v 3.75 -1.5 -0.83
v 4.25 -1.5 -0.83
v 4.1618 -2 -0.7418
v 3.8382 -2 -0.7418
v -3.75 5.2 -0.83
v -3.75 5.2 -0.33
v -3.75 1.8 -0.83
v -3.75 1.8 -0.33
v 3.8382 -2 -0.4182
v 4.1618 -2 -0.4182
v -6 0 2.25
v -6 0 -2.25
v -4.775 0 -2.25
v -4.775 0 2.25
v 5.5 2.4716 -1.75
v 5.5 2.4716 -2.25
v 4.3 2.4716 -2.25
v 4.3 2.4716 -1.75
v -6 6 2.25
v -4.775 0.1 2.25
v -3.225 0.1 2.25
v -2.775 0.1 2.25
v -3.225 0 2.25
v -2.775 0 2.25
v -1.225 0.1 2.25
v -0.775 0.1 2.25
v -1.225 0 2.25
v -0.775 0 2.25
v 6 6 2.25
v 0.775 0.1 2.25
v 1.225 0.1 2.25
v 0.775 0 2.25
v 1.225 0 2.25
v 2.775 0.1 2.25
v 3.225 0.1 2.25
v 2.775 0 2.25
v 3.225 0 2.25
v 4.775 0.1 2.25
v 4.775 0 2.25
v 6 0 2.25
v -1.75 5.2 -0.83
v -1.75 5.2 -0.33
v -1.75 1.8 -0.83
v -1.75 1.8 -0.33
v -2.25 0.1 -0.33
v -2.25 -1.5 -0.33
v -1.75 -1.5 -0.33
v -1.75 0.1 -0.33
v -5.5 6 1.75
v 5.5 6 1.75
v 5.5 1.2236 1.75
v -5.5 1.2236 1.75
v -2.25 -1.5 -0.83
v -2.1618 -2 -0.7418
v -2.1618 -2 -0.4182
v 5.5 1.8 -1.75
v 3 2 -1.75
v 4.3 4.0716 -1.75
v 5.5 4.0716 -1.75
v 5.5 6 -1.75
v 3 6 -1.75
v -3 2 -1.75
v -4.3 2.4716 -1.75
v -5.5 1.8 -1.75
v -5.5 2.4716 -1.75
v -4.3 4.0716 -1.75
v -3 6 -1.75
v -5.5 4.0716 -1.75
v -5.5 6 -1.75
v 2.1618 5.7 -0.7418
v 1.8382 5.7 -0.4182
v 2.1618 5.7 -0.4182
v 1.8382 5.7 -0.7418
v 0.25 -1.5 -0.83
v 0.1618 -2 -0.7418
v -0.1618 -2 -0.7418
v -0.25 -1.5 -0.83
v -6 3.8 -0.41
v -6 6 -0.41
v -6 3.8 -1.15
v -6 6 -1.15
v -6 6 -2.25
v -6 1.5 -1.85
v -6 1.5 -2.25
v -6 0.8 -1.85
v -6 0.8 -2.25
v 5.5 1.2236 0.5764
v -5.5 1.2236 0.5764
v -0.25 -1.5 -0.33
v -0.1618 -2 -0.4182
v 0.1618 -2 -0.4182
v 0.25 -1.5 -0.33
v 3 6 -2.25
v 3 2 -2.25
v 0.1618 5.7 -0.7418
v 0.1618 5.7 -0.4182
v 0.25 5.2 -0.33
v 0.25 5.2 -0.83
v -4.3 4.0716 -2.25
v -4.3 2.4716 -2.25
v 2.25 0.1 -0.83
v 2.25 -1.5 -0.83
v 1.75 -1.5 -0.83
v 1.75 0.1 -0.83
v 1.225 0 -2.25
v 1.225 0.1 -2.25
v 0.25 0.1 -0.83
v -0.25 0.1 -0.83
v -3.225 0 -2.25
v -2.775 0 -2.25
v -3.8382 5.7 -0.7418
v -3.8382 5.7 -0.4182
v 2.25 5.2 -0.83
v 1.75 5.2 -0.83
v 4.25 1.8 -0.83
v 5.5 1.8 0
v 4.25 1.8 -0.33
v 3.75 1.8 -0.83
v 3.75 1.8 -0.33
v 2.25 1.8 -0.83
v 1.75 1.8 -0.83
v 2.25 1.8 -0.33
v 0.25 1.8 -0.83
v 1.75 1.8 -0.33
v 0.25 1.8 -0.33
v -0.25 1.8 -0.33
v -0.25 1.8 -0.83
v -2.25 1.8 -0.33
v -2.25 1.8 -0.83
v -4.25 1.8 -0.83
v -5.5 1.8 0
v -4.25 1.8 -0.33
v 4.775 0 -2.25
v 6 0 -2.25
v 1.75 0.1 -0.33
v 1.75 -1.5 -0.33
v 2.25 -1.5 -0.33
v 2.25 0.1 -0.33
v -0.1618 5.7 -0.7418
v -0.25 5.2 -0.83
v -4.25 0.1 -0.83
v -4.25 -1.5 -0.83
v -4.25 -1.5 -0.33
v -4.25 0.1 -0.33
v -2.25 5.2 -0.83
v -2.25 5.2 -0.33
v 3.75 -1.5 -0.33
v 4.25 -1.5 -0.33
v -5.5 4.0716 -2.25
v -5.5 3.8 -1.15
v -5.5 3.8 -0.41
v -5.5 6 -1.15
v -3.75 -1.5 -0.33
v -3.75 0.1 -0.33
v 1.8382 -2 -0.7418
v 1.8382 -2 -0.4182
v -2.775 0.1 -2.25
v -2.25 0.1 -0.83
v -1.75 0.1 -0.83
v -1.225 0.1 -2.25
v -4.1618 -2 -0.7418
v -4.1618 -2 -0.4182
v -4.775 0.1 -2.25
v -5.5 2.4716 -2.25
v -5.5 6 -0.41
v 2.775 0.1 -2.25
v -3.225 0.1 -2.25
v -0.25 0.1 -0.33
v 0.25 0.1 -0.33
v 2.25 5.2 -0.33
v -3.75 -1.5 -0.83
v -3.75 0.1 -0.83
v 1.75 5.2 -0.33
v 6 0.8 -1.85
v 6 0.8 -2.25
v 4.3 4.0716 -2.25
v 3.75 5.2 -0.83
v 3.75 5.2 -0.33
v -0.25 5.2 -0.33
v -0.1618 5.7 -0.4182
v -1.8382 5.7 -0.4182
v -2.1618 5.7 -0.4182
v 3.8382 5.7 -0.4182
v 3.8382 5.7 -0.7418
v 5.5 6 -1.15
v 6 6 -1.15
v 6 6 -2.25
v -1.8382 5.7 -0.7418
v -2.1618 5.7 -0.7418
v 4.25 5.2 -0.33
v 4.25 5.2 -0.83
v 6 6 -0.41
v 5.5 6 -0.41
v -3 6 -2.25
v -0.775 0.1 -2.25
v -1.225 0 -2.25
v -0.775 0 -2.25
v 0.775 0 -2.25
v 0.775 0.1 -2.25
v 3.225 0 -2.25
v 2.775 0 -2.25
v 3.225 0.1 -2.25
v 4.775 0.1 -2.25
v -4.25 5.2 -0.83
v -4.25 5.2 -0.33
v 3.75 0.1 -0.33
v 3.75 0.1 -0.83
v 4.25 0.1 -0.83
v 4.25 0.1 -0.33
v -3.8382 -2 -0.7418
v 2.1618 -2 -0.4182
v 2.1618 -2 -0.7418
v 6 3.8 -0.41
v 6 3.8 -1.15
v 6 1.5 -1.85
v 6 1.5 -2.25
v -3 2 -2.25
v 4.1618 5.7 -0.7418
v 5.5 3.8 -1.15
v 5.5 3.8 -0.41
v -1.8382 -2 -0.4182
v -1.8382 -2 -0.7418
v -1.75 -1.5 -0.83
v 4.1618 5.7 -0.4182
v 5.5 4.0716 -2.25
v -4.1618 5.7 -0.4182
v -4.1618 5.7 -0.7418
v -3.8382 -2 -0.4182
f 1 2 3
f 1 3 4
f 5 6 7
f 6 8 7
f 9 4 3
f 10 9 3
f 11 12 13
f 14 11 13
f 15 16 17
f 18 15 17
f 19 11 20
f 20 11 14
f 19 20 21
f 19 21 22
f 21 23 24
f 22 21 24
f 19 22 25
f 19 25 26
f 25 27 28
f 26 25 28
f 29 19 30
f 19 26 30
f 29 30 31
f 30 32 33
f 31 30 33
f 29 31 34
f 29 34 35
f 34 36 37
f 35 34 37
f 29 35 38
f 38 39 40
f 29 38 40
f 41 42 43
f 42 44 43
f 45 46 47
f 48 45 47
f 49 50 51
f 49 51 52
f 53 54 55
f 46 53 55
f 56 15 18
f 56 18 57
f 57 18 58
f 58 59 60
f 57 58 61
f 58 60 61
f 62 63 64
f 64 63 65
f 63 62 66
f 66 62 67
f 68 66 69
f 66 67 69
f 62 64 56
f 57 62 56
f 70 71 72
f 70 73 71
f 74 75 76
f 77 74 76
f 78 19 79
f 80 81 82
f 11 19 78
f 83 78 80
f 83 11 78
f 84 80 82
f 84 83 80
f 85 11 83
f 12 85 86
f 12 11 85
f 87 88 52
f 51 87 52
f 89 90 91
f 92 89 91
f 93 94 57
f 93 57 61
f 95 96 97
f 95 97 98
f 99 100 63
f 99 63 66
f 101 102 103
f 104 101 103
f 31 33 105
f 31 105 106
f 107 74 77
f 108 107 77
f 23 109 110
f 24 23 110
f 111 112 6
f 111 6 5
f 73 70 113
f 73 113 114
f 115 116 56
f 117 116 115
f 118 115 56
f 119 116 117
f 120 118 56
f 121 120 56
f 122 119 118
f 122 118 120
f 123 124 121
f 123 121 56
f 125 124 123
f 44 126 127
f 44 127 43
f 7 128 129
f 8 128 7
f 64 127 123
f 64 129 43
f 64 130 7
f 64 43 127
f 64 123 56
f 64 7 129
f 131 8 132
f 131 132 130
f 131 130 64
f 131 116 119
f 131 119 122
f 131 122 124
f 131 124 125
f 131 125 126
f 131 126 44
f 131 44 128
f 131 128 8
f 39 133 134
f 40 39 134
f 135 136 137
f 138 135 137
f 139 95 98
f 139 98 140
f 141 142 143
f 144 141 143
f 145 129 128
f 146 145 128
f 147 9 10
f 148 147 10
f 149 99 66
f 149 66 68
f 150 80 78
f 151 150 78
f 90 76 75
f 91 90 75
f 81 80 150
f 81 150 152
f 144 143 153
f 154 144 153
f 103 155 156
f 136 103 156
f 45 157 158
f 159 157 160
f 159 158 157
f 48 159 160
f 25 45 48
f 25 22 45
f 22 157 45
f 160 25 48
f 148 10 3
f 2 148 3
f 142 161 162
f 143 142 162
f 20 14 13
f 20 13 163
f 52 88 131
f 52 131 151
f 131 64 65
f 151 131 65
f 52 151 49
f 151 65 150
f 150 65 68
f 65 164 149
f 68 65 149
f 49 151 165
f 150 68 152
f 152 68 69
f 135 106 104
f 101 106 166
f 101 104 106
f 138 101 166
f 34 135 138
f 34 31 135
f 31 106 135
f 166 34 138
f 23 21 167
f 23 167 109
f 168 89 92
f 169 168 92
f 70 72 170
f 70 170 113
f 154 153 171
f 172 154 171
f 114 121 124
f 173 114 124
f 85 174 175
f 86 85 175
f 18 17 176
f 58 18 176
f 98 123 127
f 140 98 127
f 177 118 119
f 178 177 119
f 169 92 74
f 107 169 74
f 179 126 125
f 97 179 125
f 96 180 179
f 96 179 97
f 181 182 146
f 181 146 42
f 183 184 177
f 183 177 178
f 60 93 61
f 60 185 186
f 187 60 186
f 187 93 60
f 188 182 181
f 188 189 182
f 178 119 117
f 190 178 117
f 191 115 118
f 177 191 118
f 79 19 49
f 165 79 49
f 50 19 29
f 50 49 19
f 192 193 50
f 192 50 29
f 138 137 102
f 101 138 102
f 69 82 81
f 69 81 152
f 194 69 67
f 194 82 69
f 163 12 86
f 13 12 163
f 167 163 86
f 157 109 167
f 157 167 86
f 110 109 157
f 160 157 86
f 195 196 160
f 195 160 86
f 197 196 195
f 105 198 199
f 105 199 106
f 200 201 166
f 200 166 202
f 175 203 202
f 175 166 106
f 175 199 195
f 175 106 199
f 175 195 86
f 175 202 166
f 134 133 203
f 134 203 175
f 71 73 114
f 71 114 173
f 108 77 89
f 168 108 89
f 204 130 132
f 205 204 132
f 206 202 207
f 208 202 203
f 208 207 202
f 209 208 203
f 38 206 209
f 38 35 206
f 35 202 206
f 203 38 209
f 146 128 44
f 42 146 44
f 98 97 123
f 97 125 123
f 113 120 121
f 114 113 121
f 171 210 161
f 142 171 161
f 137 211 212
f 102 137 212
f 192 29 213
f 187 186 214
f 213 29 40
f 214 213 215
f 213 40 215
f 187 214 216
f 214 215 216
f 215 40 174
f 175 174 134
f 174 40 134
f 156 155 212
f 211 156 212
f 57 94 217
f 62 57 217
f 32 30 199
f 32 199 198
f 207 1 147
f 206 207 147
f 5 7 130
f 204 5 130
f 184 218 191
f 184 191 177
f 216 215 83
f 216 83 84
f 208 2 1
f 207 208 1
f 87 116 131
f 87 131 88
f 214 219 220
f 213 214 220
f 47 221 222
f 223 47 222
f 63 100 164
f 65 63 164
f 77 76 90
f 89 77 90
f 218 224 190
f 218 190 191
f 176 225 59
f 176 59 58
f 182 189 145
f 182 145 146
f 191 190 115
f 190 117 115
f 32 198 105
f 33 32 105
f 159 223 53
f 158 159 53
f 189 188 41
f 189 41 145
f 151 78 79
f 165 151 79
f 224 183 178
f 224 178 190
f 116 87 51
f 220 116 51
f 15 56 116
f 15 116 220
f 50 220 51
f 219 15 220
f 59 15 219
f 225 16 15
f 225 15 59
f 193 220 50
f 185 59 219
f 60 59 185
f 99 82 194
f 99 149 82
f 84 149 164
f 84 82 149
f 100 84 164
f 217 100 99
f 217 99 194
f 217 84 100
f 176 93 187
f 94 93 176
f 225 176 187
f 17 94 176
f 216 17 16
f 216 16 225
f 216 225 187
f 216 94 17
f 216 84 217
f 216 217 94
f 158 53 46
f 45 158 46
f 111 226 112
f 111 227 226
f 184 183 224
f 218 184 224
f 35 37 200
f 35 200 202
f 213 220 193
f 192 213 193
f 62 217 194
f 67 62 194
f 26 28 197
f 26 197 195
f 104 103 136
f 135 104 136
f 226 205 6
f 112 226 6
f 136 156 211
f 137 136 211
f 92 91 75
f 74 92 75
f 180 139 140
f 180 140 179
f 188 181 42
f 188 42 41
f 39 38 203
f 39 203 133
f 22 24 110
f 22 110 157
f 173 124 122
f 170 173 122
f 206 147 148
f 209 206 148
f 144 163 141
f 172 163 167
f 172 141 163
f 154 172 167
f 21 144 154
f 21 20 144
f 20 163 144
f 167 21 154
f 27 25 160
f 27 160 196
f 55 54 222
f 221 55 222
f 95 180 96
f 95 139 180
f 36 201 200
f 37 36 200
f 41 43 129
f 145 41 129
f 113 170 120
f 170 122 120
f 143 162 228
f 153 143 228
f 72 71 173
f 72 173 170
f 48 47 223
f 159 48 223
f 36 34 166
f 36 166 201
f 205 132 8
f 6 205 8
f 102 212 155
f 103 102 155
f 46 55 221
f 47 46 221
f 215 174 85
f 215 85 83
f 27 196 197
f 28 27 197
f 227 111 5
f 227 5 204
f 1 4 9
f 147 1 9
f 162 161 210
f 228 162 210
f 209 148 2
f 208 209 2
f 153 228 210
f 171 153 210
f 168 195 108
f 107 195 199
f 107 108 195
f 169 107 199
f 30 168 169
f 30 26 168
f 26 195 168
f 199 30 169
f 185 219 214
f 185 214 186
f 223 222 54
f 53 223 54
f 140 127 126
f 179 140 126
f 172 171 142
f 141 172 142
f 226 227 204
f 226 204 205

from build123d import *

# Parameters (mm, degrees)
SKETCH1_W               = 12
SKETCH1_H               = 4.5
EXTRUDE1_DEPTH          = 6
CUT_EXTRUDE1_DEPTH      = 5.5
SKETCH3_W               = 11
SKETCH3_H               = 3.5
CUT_EXTRUDE2_DEPTH      = 4.2
SKETCH5_W               = 0.74
SKETCH5_H               = 2.2
CUT_EXTRUDE3_DEPTH      = 13
SKETCH6_W               = 6
SKETCH6_H               = 4
CUT_EXTRUDE4_DEPTH      = 1.2
SKETCH9_W               = 0.4
SKETCH9_H               = 0.7
CUT_EXTRUDE5_DEPTH      = 7
CUT_EXTRUDE5_DEPTH_BACK = 7
SKETCH10_W              = 1.2
SKETCH10_H              = 1.6
CUT_EXTRUDE6_DEPTH      = 0.5
CUT_EXTRUDE7_START      = -5.5
CUT_EXTRUDE7_DEPTH      = 11
LPATTERN4_COUNT         = 3
LPATTERN4_PITCH         = 2
LPATTERN4_COL_COUNT     = 3
LPATTERN4_COL_PITCH     = 2
EXTRUDE2_START          = -2
EXTRUDE2_DEPTH          = 7.7
LPATTERN2_COUNT         = 3
LPATTERN2_PITCH         = 2
LPATTERN2_COL_COUNT     = 3
LPATTERN2_COL_PITCH     = 2
CHAMFER1_SIZE           = 0.5
CHAMFER1_SIZE2          = 0.08816349
CHAMFER1_PART_2_SIZE    = 0.5
CHAMFER1_PART_2_SIZE2   = 0.08816349
CHAMFER1_PART_3_SIZE    = 0.5
CHAMFER1_PART_3_SIZE2   = 0.08816349
CHAMFER1_PART_4_SIZE    = 0.5
CHAMFER1_PART_4_SIZE2   = 0.08816349
CHAMFER1_PART_5_SIZE    = 0.5
CHAMFER1_PART_5_SIZE2   = 0.08816349
CHAMFER1_PART_6_SIZE    = 0.5
CHAMFER1_PART_6_SIZE2   = 0.08816349
CHAMFER1_PART_7_SIZE    = 0.5
CHAMFER1_PART_7_SIZE2   = 0.08816349
CHAMFER1_PART_8_SIZE    = 0.5
CHAMFER1_PART_8_SIZE2   = 0.08816349
CHAMFER1_PART_9_SIZE    = 0.5
CHAMFER1_PART_9_SIZE2   = 0.08816349
CHAMFER1_PART_10_SIZE   = 0.5
CHAMFER1_PART_10_SIZE2  = 0.08816349
CHAMFER1_PART_11_SIZE   = 0.5
CHAMFER1_PART_11_SIZE2  = 0.08816349
CHAMFER1_PART_12_SIZE   = 0.5
CHAMFER1_PART_12_SIZE2  = 0.08816349
CHAMFER1_PART_13_SIZE   = 0.5
CHAMFER1_PART_13_SIZE2  = 0.08816349
CHAMFER1_PART_14_SIZE   = 0.5
CHAMFER1_PART_14_SIZE2  = 0.08816349
CHAMFER1_PART_15_SIZE   = 0.5
CHAMFER1_PART_15_SIZE2  = 0.08816349
CHAMFER1_PART_16_SIZE   = 0.5
CHAMFER1_PART_16_SIZE2  = 0.08816349
CHAMFER1_PART_17_SIZE   = 0.5
CHAMFER1_PART_17_SIZE2  = 0.08816349
CHAMFER1_PART_18_SIZE   = 0.5
CHAMFER1_PART_18_SIZE2  = 0.08816349
CHAMFER1_PART_19_SIZE   = 0.5
CHAMFER1_PART_19_SIZE2  = 0.08816349
CHAMFER1_PART_20_SIZE   = 0.5
CHAMFER1_PART_20_SIZE2  = 0.08816349
CHAMFER1_PART_21_SIZE   = 0.5
CHAMFER1_PART_21_SIZE2  = 0.08816349
CHAMFER1_PART_22_SIZE   = 0.5
CHAMFER1_PART_22_SIZE2  = 0.08816349
CHAMFER1_PART_23_SIZE   = 0.5
CHAMFER1_PART_23_SIZE2  = 0.08816349
CHAMFER1_PART_24_SIZE   = 0.5
CHAMFER1_PART_24_SIZE2  = 0.08816349
CHAMFER1_PART_25_SIZE   = 0.5
CHAMFER1_PART_25_SIZE2  = 0.08816349
CHAMFER1_PART_26_SIZE   = 0.5
CHAMFER1_PART_26_SIZE2  = 0.08816349
CHAMFER1_PART_27_SIZE   = 0.5
CHAMFER1_PART_27_SIZE2  = 0.08816349
CHAMFER1_PART_28_SIZE   = 0.5
CHAMFER1_PART_28_SIZE2  = 0.08816349
CHAMFER1_PART_29_SIZE   = 0.5
CHAMFER1_PART_29_SIZE2  = 0.08816349
CHAMFER1_PART_30_SIZE   = 0.5
CHAMFER1_PART_30_SIZE2  = 0.08816349
CHAMFER1_PART_31_SIZE   = 0.5
CHAMFER1_PART_31_SIZE2  = 0.08816349
CHAMFER1_PART_32_SIZE   = 0.5
CHAMFER1_PART_32_SIZE2  = 0.08816349
CHAMFER1_PART_33_SIZE   = 0.5
CHAMFER1_PART_33_SIZE2  = 0.08816349
CHAMFER1_PART_34_SIZE   = 0.5
CHAMFER1_PART_34_SIZE2  = 0.08816349
CHAMFER1_PART_35_SIZE   = 0.5
CHAMFER1_PART_35_SIZE2  = 0.08816349
CHAMFER1_PART_36_SIZE   = 0.5
CHAMFER1_PART_36_SIZE2  = 0.08816349
CHAMFER1_PART_37_SIZE   = 0.5
CHAMFER1_PART_37_SIZE2  = 0.08816349
CHAMFER1_PART_38_SIZE   = 0.5
CHAMFER1_PART_38_SIZE2  = 0.08816349
CHAMFER1_PART_39_SIZE   = 0.5
CHAMFER1_PART_39_SIZE2  = 0.08816349
CHAMFER1_PART_40_SIZE   = 0.5
CHAMFER1_PART_40_SIZE2  = 0.08816349


with BuildPart() as part:
    # Sketch1 → Extrude1 (new body)
    with BuildSketch(Plane(origin=(0, 0, 0), x_dir=(1, 0, 0), z_dir=(0, 1, 0))):
        Rectangle(SKETCH1_W, SKETCH1_H)
    extrude(amount=EXTRUDE1_DEPTH)

    # Sketch2 → Cut-Extrude1 (cut, through all)
    with BuildSketch(Plane.XY.offset(2.25)):
        Polygon((-0.775, 0.1), (0.775, 0.1), (0.775, 0), (0, 0), (-0.775, 0), align=None)
    cut_extrude1 = extrude(amount=-CUT_EXTRUDE1_DEPTH, mode=Mode.SUBTRACT)

    # Sketch3 → Cut-Extrude2 (cut)
    with BuildSketch(Plane(origin=(0, 6, 0), x_dir=(-1, 0, 0), z_dir=(0, 1, 0))):
        Rectangle(SKETCH3_W, SKETCH3_H)
    extrude(amount=-CUT_EXTRUDE2_DEPTH, mode=Mode.SUBTRACT)

    # Sketch5 → Cut-Extrude3 (cut, through all)
    with BuildSketch(Plane.ZY.offset(6)):
        with Locations((-0.78, 4.9)):
            Rectangle(SKETCH5_W, SKETCH5_H)
    extrude(amount=-CUT_EXTRUDE3_DEPTH, mode=Mode.SUBTRACT)

    # Sketch6 → Cut-Extrude4 (cut)
    with BuildSketch(Plane(origin=(0, 0, -2.25), x_dir=(-1, 0, 0), z_dir=(0, 0, -1))):
        with Locations((0, 4)):
            Rectangle(SKETCH6_W, SKETCH6_H)
    extrude(amount=-CUT_EXTRUDE4_DEPTH, mode=Mode.SUBTRACT)

    # Sketch9 → Cut-Extrude5 (cut, two sides)
    with BuildSketch(Plane(origin=(0, 0, 0), x_dir=(0, 0, -1), z_dir=(1, 0, 0))) as cut_extrude5_sk:
        with Locations((2.05, 1.15)):
            Rectangle(SKETCH9_W, SKETCH9_H)
    extrude(amount=CUT_EXTRUDE5_DEPTH, mode=Mode.SUBTRACT)
    extrude(cut_extrude5_sk.sketch, amount=-CUT_EXTRUDE5_DEPTH_BACK, mode=Mode.SUBTRACT)

    # Sketch10 → Cut-Extrude6 (cut)
    with BuildSketch(Plane(origin=(0, 0, -2.25), x_dir=(-1, 0, 0), z_dir=(0, 0, -1))):
        with Locations((-4.9, 3.271645398)):
            Rectangle(SKETCH10_W, SKETCH10_H)
        with Locations((4.9, 3.271645398)):
            Rectangle(SKETCH10_W, SKETCH10_H)
    extrude(amount=-CUT_EXTRUDE6_DEPTH, mode=Mode.SUBTRACT)

    # Sketch11 → Cut-Extrude7 (cut)
    with BuildSketch(Plane(origin=(0, 0, 0), x_dir=(0, 0, -1), z_dir=(1, 0, 0)).offset(CUT_EXTRUDE7_START)):
        Polygon((0, 1.8), (-0.576387184, 1.223612816), (-1.75, 1.223612816), (-1.75, 1.8), align=None)
    extrude(amount=CUT_EXTRUDE7_DEPTH, mode=Mode.SUBTRACT)

    # LPattern4: Cut-Extrude1 ×3
    with Locations(*[(i * LPATTERN4_PITCH, 0, 0) for i in range(1, LPATTERN4_COUNT)]):
        add(cut_extrude1, mode=Mode.SUBTRACT)

    # LPattern4 col: Cut-Extrude1 ×3
    with Locations(*[(-i * LPATTERN4_COL_PITCH, 0, 0) for i in range(1, LPATTERN4_COL_COUNT)]):
        add(cut_extrude1, mode=Mode.SUBTRACT)

    # Sketch7 → Extrude2 (add)
    with BuildSketch(Plane(origin=(0, 0, 0), x_dir=(1, 0, 0), z_dir=(0, 1, 0)).offset(EXTRUDE2_START)):
        Polygon((0, 0.33), (0.25, 0.33), (0.25, 0.83), (-0.25, 0.83), (-0.25, 0.33), align=None)
    extrude2 = extrude(amount=EXTRUDE2_DEPTH)

    # LPattern2: Extrude2 ×3
    with Locations(*[(i * LPATTERN2_PITCH, 0, 0) for i in range(1, LPATTERN2_COUNT)]):
        add(extrude2)

    # LPattern2 col: Extrude2 ×3
    with Locations(*[(-i * LPATTERN2_COL_PITCH, 0, 0) for i in range(1, LPATTERN2_COL_COUNT)]):
        add(extrude2)

    # Chamfer1
    chamfer1_edges = [part.edges().sort_by_distance(p)[0] for p in [
        (-0.25, -2, -0.58),
    ]]
    chamfer1_side = [part.faces().sort_by_distance(p)[0] for p in [
        (-0.25, -0.95, -0.58),
    ]]
    chamfer(chamfer1_edges, length=CHAMFER1_SIZE, length2=CHAMFER1_SIZE2, reference=chamfer1_side[0])

    # Chamfer1 part 2
    chamfer1_part_2_edges = [part.edges().sort_by_distance(p)[0] for p in [
        (0, -2, -0.33),
    ]]
    chamfer1_part_2_side = [part.faces().sort_by_distance(p)[0] for p in [
        (0, -0.95, -0.33),
    ]]
    chamfer(chamfer1_part_2_edges, length=CHAMFER1_PART_2_SIZE, length2=CHAMFER1_PART_2_SIZE2, reference=chamfer1_part_2_side[0])

    # Chamfer1 part 3
    chamfer1_part_3_edges = [part.edges().sort_by_distance(p)[0] for p in [
        (0.25, -2, -0.58),
    ]]
    chamfer1_part_3_side = [part.faces().sort_by_distance(p)[0] for p in [
        (0.25, -0.95, -0.58),
    ]]
    chamfer(chamfer1_part_3_edges, length=CHAMFER1_PART_3_SIZE, length2=CHAMFER1_PART_3_SIZE2, reference=chamfer1_part_3_side[0])

    # Chamfer1 part 4
    chamfer1_part_4_edges = [part.edges().sort_by_distance(p)[0] for p in [
        (0, -2, -0.83),
    ]]
    chamfer1_part_4_side = [part.faces().sort_by_distance(p)[0] for p in [
        (0, -0.95, -0.83),
    ]]
    chamfer(chamfer1_part_4_edges, length=CHAMFER1_PART_4_SIZE, length2=CHAMFER1_PART_4_SIZE2, reference=chamfer1_part_4_side[0])

    # Chamfer1 part 5
    chamfer1_part_5_edges = [part.edges().sort_by_distance(p)[0] for p in [
        (0, 5.7, -0.83),
    ]]
    chamfer1_part_5_side = [part.faces().sort_by_distance(p)[0] for p in [
        (0, 3.75, -0.83),
    ]]
    chamfer(chamfer1_part_5_edges, length=CHAMFER1_PART_5_SIZE, length2=CHAMFER1_PART_5_SIZE2, reference=chamfer1_part_5_side[0])

    # Chamfer1 part 6
    chamfer1_part_6_edges = [part.edges().sort_by_distance(p)[0] for p in [
        (-0.25, 5.7, -0.58),
    ]]
    chamfer1_part_6_side = [part.faces().sort_by_distance(p)[0] for p in [
        (-0.25, 3.75, -0.58),
    ]]
    chamfer(chamfer1_part_6_edges, length=CHAMFER1_PART_6_SIZE, length2=CHAMFER1_PART_6_SIZE2, reference=chamfer1_part_6_side[0])

    # Chamfer1 part 7
    chamfer1_part_7_edges = [part.edges().sort_by_distance(p)[0] for p in [
        (0, 5.7, -0.33),
    ]]
    chamfer1_part_7_side = [part.faces().sort_by_distance(p)[0] for p in [
        (0, 3.75, -0.33),
    ]]
    chamfer(chamfer1_part_7_edges, length=CHAMFER1_PART_7_SIZE, length2=CHAMFER1_PART_7_SIZE2, reference=chamfer1_part_7_side[0])

    # Chamfer1 part 8
    chamfer1_part_8_edges = [part.edges().sort_by_distance(p)[0] for p in [
        (0.25, 5.7, -0.58),
    ]]
    chamfer1_part_8_side = [part.faces().sort_by_distance(p)[0] for p in [
        (0.25, 3.75, -0.58),
    ]]
    chamfer(chamfer1_part_8_edges, length=CHAMFER1_PART_8_SIZE, length2=CHAMFER1_PART_8_SIZE2, reference=chamfer1_part_8_side[0])

    # Chamfer1 part 9
    chamfer1_part_9_edges = [part.edges().sort_by_distance(p)[0] for p in [
        (-2.25, -2, -0.58),
    ]]
    chamfer1_part_9_side = [part.faces().sort_by_distance(p)[0] for p in [
        (-2.25, -0.95, -0.58),
    ]]
    chamfer(chamfer1_part_9_edges, length=CHAMFER1_PART_9_SIZE, length2=CHAMFER1_PART_9_SIZE2, reference=chamfer1_part_9_side[0])

    # Chamfer1 part 10
    chamfer1_part_10_edges = [part.edges().sort_by_distance(p)[0] for p in [
        (-2, -2, -0.33),
    ]]
    chamfer1_part_10_side = [part.faces().sort_by_distance(p)[0] for p in [
        (-2, -0.95, -0.33),
    ]]
    chamfer(chamfer1_part_10_edges, length=CHAMFER1_PART_10_SIZE, length2=CHAMFER1_PART_10_SIZE2, reference=chamfer1_part_10_side[0])

    # Chamfer1 part 11
    chamfer1_part_11_edges = [part.edges().sort_by_distance(p)[0] for p in [
        (-1.75, -2, -0.58),
    ]]
    chamfer1_part_11_side = [part.faces().sort_by_distance(p)[0] for p in [
        (-1.75, -0.95, -0.58),
    ]]
    chamfer(chamfer1_part_11_edges, length=CHAMFER1_PART_11_SIZE, length2=CHAMFER1_PART_11_SIZE2, reference=chamfer1_part_11_side[0])

    # Chamfer1 part 12
    chamfer1_part_12_edges = [part.edges().sort_by_distance(p)[0] for p in [
        (-2, -2, -0.83),
    ]]
    chamfer1_part_12_side = [part.faces().sort_by_distance(p)[0] for p in [
        (-2, -0.95, -0.83),
    ]]
    chamfer(chamfer1_part_12_edges, length=CHAMFER1_PART_12_SIZE, length2=CHAMFER1_PART_12_SIZE2, reference=chamfer1_part_12_side[0])

    # Chamfer1 part 13
    chamfer1_part_13_edges = [part.edges().sort_by_distance(p)[0] for p in [
        (-2, 5.7, -0.83),
    ]]
    chamfer1_part_13_side = [part.faces().sort_by_distance(p)[0] for p in [
        (-2, 3.75, -0.83),
    ]]
    chamfer(chamfer1_part_13_edges, length=CHAMFER1_PART_13_SIZE, length2=CHAMFER1_PART_13_SIZE2, reference=chamfer1_part_13_side[0])

    # Chamfer1 part 14
    chamfer1_part_14_edges = [part.edges().sort_by_distance(p)[0] for p in [
        (-2.25, 5.7, -0.58),
    ]]
    chamfer1_part_14_side = [part.faces().sort_by_distance(p)[0] for p in [
        (-2.25, 3.75, -0.58),
    ]]
    chamfer(chamfer1_part_14_edges, length=CHAMFER1_PART_14_SIZE, length2=CHAMFER1_PART_14_SIZE2, reference=chamfer1_part_14_side[0])

    # Chamfer1 part 15
    chamfer1_part_15_edges = [part.edges().sort_by_distance(p)[0] for p in [
        (-2, 5.7, -0.33),
    ]]
    chamfer1_part_15_side = [part.faces().sort_by_distance(p)[0] for p in [
        (-2, 3.75, -0.33),
    ]]
    chamfer(chamfer1_part_15_edges, length=CHAMFER1_PART_15_SIZE, length2=CHAMFER1_PART_15_SIZE2, reference=chamfer1_part_15_side[0])

    # Chamfer1 part 16
    chamfer1_part_16_edges = [part.edges().sort_by_distance(p)[0] for p in [
        (-1.75, 5.7, -0.58),
    ]]
    chamfer1_part_16_side = [part.faces().sort_by_distance(p)[0] for p in [
        (-1.75, 3.75, -0.58),
    ]]
    chamfer(chamfer1_part_16_edges, length=CHAMFER1_PART_16_SIZE, length2=CHAMFER1_PART_16_SIZE2, reference=chamfer1_part_16_side[0])

    # Chamfer1 part 17
    chamfer1_part_17_edges = [part.edges().sort_by_distance(p)[0] for p in [
        (-4.25, -2, -0.58),
    ]]
    chamfer1_part_17_side = [part.faces().sort_by_distance(p)[0] for p in [
        (-4.25, -0.95, -0.58),
    ]]
    chamfer(chamfer1_part_17_edges, length=CHAMFER1_PART_17_SIZE, length2=CHAMFER1_PART_17_SIZE2, reference=chamfer1_part_17_side[0])

    # Chamfer1 part 18
    chamfer1_part_18_edges = [part.edges().sort_by_distance(p)[0] for p in [
        (-4, -2, -0.33),
    ]]
    chamfer1_part_18_side = [part.faces().sort_by_distance(p)[0] for p in [
        (-4, -0.95, -0.33),
    ]]
    chamfer(chamfer1_part_18_edges, length=CHAMFER1_PART_18_SIZE, length2=CHAMFER1_PART_18_SIZE2, reference=chamfer1_part_18_side[0])

    # Chamfer1 part 19
    chamfer1_part_19_edges = [part.edges().sort_by_distance(p)[0] for p in [
        (-3.75, -2, -0.58),
    ]]
    chamfer1_part_19_side = [part.faces().sort_by_distance(p)[0] for p in [
        (-3.75, -0.95, -0.58),
    ]]
    chamfer(chamfer1_part_19_edges, length=CHAMFER1_PART_19_SIZE, length2=CHAMFER1_PART_19_SIZE2, reference=chamfer1_part_19_side[0])

    # Chamfer1 part 20
    chamfer1_part_20_edges = [part.edges().sort_by_distance(p)[0] for p in [
        (-4, -2, -0.83),
    ]]
    chamfer1_part_20_side = [part.faces().sort_by_distance(p)[0] for p in [
        (-4, -0.95, -0.83),
    ]]
    chamfer(chamfer1_part_20_edges, length=CHAMFER1_PART_20_SIZE, length2=CHAMFER1_PART_20_SIZE2, reference=chamfer1_part_20_side[0])

    # Chamfer1 part 21
    chamfer1_part_21_edges = [part.edges().sort_by_distance(p)[0] for p in [
        (-4, 5.7, -0.83),
    ]]
    chamfer1_part_21_side = [part.faces().sort_by_distance(p)[0] for p in [
        (-4, 3.75, -0.83),
    ]]
    chamfer(chamfer1_part_21_edges, length=CHAMFER1_PART_21_SIZE, length2=CHAMFER1_PART_21_SIZE2, reference=chamfer1_part_21_side[0])

    # Chamfer1 part 22
    chamfer1_part_22_edges = [part.edges().sort_by_distance(p)[0] for p in [
        (-4.25, 5.7, -0.58),
    ]]
    chamfer1_part_22_side = [part.faces().sort_by_distance(p)[0] for p in [
        (-4.25, 3.75, -0.58),
    ]]
    chamfer(chamfer1_part_22_edges, length=CHAMFER1_PART_22_SIZE, length2=CHAMFER1_PART_22_SIZE2, reference=chamfer1_part_22_side[0])

    # Chamfer1 part 23
    chamfer1_part_23_edges = [part.edges().sort_by_distance(p)[0] for p in [
        (-4, 5.7, -0.33),
    ]]
    chamfer1_part_23_side = [part.faces().sort_by_distance(p)[0] for p in [
        (-4, 3.75, -0.33),
    ]]
    chamfer(chamfer1_part_23_edges, length=CHAMFER1_PART_23_SIZE, length2=CHAMFER1_PART_23_SIZE2, reference=chamfer1_part_23_side[0])

    # Chamfer1 part 24
    chamfer1_part_24_edges = [part.edges().sort_by_distance(p)[0] for p in [
        (-3.75, 5.7, -0.58),
    ]]
    chamfer1_part_24_side = [part.faces().sort_by_distance(p)[0] for p in [
        (-3.75, 3.75, -0.58),
    ]]
    chamfer(chamfer1_part_24_edges, length=CHAMFER1_PART_24_SIZE, length2=CHAMFER1_PART_24_SIZE2, reference=chamfer1_part_24_side[0])

    # Chamfer1 part 25
    chamfer1_part_25_edges = [part.edges().sort_by_distance(p)[0] for p in [
        (1.75, -2, -0.58),
    ]]
    chamfer1_part_25_side = [part.faces().sort_by_distance(p)[0] for p in [
        (1.75, -0.95, -0.58),
    ]]
    chamfer(chamfer1_part_25_edges, length=CHAMFER1_PART_25_SIZE, length2=CHAMFER1_PART_25_SIZE2, reference=chamfer1_part_25_side[0])

    # Chamfer1 part 26
    chamfer1_part_26_edges = [part.edges().sort_by_distance(p)[0] for p in [
        (2, -2, -0.33),
    ]]
    chamfer1_part_26_side = [part.faces().sort_by_distance(p)[0] for p in [
        (2, -0.95, -0.33),
    ]]
    chamfer(chamfer1_part_26_edges, length=CHAMFER1_PART_26_SIZE, length2=CHAMFER1_PART_26_SIZE2, reference=chamfer1_part_26_side[0])

    # Chamfer1 part 27
    chamfer1_part_27_edges = [part.edges().sort_by_distance(p)[0] for p in [
        (2.25, -2, -0.58),
    ]]
    chamfer1_part_27_side = [part.faces().sort_by_distance(p)[0] for p in [
        (2.25, -0.95, -0.58),
    ]]
    chamfer(chamfer1_part_27_edges, length=CHAMFER1_PART_27_SIZE, length2=CHAMFER1_PART_27_SIZE2, reference=chamfer1_part_27_side[0])

    # Chamfer1 part 28
    chamfer1_part_28_edges = [part.edges().sort_by_distance(p)[0] for p in [
        (2, -2, -0.83),
    ]]
    chamfer1_part_28_side = [part.faces().sort_by_distance(p)[0] for p in [
        (2, -0.95, -0.83),
    ]]
    chamfer(chamfer1_part_28_edges, length=CHAMFER1_PART_28_SIZE, length2=CHAMFER1_PART_28_SIZE2, reference=chamfer1_part_28_side[0])

    # Chamfer1 part 29
    chamfer1_part_29_edges = [part.edges().sort_by_distance(p)[0] for p in [
        (2, 5.7, -0.83),
    ]]
    chamfer1_part_29_side = [part.faces().sort_by_distance(p)[0] for p in [
        (2, 3.75, -0.83),
    ]]
    chamfer(chamfer1_part_29_edges, length=CHAMFER1_PART_29_SIZE, length2=CHAMFER1_PART_29_SIZE2, reference=chamfer1_part_29_side[0])

    # Chamfer1 part 30
    chamfer1_part_30_edges = [part.edges().sort_by_distance(p)[0] for p in [
        (1.75, 5.7, -0.58),
    ]]
    chamfer1_part_30_side = [part.faces().sort_by_distance(p)[0] for p in [
        (1.75, 3.75, -0.58),
    ]]
    chamfer(chamfer1_part_30_edges, length=CHAMFER1_PART_30_SIZE, length2=CHAMFER1_PART_30_SIZE2, reference=chamfer1_part_30_side[0])

    # Chamfer1 part 31
    chamfer1_part_31_edges = [part.edges().sort_by_distance(p)[0] for p in [
        (2, 5.7, -0.33),
    ]]
    chamfer1_part_31_side = [part.faces().sort_by_distance(p)[0] for p in [
        (2, 3.75, -0.33),
    ]]
    chamfer(chamfer1_part_31_edges, length=CHAMFER1_PART_31_SIZE, length2=CHAMFER1_PART_31_SIZE2, reference=chamfer1_part_31_side[0])

    # Chamfer1 part 32
    chamfer1_part_32_edges = [part.edges().sort_by_distance(p)[0] for p in [
        (2.25, 5.7, -0.58),
    ]]
    chamfer1_part_32_side = [part.faces().sort_by_distance(p)[0] for p in [
        (2.25, 3.75, -0.58),
    ]]
    chamfer(chamfer1_part_32_edges, length=CHAMFER1_PART_32_SIZE, length2=CHAMFER1_PART_32_SIZE2, reference=chamfer1_part_32_side[0])

    # Chamfer1 part 33
    chamfer1_part_33_edges = [part.edges().sort_by_distance(p)[0] for p in [
        (3.75, -2, -0.58),
    ]]
    chamfer1_part_33_side = [part.faces().sort_by_distance(p)[0] for p in [
        (3.75, -0.95, -0.58),
    ]]
    chamfer(chamfer1_part_33_edges, length=CHAMFER1_PART_33_SIZE, length2=CHAMFER1_PART_33_SIZE2, reference=chamfer1_part_33_side[0])

    # Chamfer1 part 34
    chamfer1_part_34_edges = [part.edges().sort_by_distance(p)[0] for p in [
        (4, -2, -0.33),
    ]]
    chamfer1_part_34_side = [part.faces().sort_by_distance(p)[0] for p in [
        (4, -0.95, -0.33),
    ]]
    chamfer(chamfer1_part_34_edges, length=CHAMFER1_PART_34_SIZE, length2=CHAMFER1_PART_34_SIZE2, reference=chamfer1_part_34_side[0])

    # Chamfer1 part 35
    chamfer1_part_35_edges = [part.edges().sort_by_distance(p)[0] for p in [
        (4.25, -2, -0.58),
    ]]
    chamfer1_part_35_side = [part.faces().sort_by_distance(p)[0] for p in [
        (4.25, -0.95, -0.58),
    ]]
    chamfer(chamfer1_part_35_edges, length=CHAMFER1_PART_35_SIZE, length2=CHAMFER1_PART_35_SIZE2, reference=chamfer1_part_35_side[0])

    # Chamfer1 part 36
    chamfer1_part_36_edges = [part.edges().sort_by_distance(p)[0] for p in [
        (4, -2, -0.83),
    ]]
    chamfer1_part_36_side = [part.faces().sort_by_distance(p)[0] for p in [
        (4, -0.95, -0.83),
    ]]
    chamfer(chamfer1_part_36_edges, length=CHAMFER1_PART_36_SIZE, length2=CHAMFER1_PART_36_SIZE2, reference=chamfer1_part_36_side[0])

    # Chamfer1 part 37
    chamfer1_part_37_edges = [part.edges().sort_by_distance(p)[0] for p in [
        (4, 5.7, -0.83),
    ]]
    chamfer1_part_37_side = [part.faces().sort_by_distance(p)[0] for p in [
        (4, 3.75, -0.83),
    ]]
    chamfer(chamfer1_part_37_edges, length=CHAMFER1_PART_37_SIZE, length2=CHAMFER1_PART_37_SIZE2, reference=chamfer1_part_37_side[0])

    # Chamfer1 part 38
    chamfer1_part_38_edges = [part.edges().sort_by_distance(p)[0] for p in [
        (3.75, 5.7, -0.58),
    ]]
    chamfer1_part_38_side = [part.faces().sort_by_distance(p)[0] for p in [
        (3.75, 3.75, -0.58),
    ]]
    chamfer(chamfer1_part_38_edges, length=CHAMFER1_PART_38_SIZE, length2=CHAMFER1_PART_38_SIZE2, reference=chamfer1_part_38_side[0])

    # Chamfer1 part 39
    chamfer1_part_39_edges = [part.edges().sort_by_distance(p)[0] for p in [
        (4, 5.7, -0.33),
    ]]
    chamfer1_part_39_side = [part.faces().sort_by_distance(p)[0] for p in [
        (4, 3.75, -0.33),
    ]]
    chamfer(chamfer1_part_39_edges, length=CHAMFER1_PART_39_SIZE, length2=CHAMFER1_PART_39_SIZE2, reference=chamfer1_part_39_side[0])

    # Chamfer1 part 40
    chamfer1_part_40_edges = [part.edges().sort_by_distance(p)[0] for p in [
        (4.25, 5.7, -0.58),
    ]]
    chamfer1_part_40_side = [part.faces().sort_by_distance(p)[0] for p in [
        (4.25, 3.75, -0.58),
    ]]
    chamfer(chamfer1_part_40_edges, length=CHAMFER1_PART_40_SIZE, length2=CHAMFER1_PART_40_SIZE2, reference=chamfer1_part_40_side[0])


solid = part.part
